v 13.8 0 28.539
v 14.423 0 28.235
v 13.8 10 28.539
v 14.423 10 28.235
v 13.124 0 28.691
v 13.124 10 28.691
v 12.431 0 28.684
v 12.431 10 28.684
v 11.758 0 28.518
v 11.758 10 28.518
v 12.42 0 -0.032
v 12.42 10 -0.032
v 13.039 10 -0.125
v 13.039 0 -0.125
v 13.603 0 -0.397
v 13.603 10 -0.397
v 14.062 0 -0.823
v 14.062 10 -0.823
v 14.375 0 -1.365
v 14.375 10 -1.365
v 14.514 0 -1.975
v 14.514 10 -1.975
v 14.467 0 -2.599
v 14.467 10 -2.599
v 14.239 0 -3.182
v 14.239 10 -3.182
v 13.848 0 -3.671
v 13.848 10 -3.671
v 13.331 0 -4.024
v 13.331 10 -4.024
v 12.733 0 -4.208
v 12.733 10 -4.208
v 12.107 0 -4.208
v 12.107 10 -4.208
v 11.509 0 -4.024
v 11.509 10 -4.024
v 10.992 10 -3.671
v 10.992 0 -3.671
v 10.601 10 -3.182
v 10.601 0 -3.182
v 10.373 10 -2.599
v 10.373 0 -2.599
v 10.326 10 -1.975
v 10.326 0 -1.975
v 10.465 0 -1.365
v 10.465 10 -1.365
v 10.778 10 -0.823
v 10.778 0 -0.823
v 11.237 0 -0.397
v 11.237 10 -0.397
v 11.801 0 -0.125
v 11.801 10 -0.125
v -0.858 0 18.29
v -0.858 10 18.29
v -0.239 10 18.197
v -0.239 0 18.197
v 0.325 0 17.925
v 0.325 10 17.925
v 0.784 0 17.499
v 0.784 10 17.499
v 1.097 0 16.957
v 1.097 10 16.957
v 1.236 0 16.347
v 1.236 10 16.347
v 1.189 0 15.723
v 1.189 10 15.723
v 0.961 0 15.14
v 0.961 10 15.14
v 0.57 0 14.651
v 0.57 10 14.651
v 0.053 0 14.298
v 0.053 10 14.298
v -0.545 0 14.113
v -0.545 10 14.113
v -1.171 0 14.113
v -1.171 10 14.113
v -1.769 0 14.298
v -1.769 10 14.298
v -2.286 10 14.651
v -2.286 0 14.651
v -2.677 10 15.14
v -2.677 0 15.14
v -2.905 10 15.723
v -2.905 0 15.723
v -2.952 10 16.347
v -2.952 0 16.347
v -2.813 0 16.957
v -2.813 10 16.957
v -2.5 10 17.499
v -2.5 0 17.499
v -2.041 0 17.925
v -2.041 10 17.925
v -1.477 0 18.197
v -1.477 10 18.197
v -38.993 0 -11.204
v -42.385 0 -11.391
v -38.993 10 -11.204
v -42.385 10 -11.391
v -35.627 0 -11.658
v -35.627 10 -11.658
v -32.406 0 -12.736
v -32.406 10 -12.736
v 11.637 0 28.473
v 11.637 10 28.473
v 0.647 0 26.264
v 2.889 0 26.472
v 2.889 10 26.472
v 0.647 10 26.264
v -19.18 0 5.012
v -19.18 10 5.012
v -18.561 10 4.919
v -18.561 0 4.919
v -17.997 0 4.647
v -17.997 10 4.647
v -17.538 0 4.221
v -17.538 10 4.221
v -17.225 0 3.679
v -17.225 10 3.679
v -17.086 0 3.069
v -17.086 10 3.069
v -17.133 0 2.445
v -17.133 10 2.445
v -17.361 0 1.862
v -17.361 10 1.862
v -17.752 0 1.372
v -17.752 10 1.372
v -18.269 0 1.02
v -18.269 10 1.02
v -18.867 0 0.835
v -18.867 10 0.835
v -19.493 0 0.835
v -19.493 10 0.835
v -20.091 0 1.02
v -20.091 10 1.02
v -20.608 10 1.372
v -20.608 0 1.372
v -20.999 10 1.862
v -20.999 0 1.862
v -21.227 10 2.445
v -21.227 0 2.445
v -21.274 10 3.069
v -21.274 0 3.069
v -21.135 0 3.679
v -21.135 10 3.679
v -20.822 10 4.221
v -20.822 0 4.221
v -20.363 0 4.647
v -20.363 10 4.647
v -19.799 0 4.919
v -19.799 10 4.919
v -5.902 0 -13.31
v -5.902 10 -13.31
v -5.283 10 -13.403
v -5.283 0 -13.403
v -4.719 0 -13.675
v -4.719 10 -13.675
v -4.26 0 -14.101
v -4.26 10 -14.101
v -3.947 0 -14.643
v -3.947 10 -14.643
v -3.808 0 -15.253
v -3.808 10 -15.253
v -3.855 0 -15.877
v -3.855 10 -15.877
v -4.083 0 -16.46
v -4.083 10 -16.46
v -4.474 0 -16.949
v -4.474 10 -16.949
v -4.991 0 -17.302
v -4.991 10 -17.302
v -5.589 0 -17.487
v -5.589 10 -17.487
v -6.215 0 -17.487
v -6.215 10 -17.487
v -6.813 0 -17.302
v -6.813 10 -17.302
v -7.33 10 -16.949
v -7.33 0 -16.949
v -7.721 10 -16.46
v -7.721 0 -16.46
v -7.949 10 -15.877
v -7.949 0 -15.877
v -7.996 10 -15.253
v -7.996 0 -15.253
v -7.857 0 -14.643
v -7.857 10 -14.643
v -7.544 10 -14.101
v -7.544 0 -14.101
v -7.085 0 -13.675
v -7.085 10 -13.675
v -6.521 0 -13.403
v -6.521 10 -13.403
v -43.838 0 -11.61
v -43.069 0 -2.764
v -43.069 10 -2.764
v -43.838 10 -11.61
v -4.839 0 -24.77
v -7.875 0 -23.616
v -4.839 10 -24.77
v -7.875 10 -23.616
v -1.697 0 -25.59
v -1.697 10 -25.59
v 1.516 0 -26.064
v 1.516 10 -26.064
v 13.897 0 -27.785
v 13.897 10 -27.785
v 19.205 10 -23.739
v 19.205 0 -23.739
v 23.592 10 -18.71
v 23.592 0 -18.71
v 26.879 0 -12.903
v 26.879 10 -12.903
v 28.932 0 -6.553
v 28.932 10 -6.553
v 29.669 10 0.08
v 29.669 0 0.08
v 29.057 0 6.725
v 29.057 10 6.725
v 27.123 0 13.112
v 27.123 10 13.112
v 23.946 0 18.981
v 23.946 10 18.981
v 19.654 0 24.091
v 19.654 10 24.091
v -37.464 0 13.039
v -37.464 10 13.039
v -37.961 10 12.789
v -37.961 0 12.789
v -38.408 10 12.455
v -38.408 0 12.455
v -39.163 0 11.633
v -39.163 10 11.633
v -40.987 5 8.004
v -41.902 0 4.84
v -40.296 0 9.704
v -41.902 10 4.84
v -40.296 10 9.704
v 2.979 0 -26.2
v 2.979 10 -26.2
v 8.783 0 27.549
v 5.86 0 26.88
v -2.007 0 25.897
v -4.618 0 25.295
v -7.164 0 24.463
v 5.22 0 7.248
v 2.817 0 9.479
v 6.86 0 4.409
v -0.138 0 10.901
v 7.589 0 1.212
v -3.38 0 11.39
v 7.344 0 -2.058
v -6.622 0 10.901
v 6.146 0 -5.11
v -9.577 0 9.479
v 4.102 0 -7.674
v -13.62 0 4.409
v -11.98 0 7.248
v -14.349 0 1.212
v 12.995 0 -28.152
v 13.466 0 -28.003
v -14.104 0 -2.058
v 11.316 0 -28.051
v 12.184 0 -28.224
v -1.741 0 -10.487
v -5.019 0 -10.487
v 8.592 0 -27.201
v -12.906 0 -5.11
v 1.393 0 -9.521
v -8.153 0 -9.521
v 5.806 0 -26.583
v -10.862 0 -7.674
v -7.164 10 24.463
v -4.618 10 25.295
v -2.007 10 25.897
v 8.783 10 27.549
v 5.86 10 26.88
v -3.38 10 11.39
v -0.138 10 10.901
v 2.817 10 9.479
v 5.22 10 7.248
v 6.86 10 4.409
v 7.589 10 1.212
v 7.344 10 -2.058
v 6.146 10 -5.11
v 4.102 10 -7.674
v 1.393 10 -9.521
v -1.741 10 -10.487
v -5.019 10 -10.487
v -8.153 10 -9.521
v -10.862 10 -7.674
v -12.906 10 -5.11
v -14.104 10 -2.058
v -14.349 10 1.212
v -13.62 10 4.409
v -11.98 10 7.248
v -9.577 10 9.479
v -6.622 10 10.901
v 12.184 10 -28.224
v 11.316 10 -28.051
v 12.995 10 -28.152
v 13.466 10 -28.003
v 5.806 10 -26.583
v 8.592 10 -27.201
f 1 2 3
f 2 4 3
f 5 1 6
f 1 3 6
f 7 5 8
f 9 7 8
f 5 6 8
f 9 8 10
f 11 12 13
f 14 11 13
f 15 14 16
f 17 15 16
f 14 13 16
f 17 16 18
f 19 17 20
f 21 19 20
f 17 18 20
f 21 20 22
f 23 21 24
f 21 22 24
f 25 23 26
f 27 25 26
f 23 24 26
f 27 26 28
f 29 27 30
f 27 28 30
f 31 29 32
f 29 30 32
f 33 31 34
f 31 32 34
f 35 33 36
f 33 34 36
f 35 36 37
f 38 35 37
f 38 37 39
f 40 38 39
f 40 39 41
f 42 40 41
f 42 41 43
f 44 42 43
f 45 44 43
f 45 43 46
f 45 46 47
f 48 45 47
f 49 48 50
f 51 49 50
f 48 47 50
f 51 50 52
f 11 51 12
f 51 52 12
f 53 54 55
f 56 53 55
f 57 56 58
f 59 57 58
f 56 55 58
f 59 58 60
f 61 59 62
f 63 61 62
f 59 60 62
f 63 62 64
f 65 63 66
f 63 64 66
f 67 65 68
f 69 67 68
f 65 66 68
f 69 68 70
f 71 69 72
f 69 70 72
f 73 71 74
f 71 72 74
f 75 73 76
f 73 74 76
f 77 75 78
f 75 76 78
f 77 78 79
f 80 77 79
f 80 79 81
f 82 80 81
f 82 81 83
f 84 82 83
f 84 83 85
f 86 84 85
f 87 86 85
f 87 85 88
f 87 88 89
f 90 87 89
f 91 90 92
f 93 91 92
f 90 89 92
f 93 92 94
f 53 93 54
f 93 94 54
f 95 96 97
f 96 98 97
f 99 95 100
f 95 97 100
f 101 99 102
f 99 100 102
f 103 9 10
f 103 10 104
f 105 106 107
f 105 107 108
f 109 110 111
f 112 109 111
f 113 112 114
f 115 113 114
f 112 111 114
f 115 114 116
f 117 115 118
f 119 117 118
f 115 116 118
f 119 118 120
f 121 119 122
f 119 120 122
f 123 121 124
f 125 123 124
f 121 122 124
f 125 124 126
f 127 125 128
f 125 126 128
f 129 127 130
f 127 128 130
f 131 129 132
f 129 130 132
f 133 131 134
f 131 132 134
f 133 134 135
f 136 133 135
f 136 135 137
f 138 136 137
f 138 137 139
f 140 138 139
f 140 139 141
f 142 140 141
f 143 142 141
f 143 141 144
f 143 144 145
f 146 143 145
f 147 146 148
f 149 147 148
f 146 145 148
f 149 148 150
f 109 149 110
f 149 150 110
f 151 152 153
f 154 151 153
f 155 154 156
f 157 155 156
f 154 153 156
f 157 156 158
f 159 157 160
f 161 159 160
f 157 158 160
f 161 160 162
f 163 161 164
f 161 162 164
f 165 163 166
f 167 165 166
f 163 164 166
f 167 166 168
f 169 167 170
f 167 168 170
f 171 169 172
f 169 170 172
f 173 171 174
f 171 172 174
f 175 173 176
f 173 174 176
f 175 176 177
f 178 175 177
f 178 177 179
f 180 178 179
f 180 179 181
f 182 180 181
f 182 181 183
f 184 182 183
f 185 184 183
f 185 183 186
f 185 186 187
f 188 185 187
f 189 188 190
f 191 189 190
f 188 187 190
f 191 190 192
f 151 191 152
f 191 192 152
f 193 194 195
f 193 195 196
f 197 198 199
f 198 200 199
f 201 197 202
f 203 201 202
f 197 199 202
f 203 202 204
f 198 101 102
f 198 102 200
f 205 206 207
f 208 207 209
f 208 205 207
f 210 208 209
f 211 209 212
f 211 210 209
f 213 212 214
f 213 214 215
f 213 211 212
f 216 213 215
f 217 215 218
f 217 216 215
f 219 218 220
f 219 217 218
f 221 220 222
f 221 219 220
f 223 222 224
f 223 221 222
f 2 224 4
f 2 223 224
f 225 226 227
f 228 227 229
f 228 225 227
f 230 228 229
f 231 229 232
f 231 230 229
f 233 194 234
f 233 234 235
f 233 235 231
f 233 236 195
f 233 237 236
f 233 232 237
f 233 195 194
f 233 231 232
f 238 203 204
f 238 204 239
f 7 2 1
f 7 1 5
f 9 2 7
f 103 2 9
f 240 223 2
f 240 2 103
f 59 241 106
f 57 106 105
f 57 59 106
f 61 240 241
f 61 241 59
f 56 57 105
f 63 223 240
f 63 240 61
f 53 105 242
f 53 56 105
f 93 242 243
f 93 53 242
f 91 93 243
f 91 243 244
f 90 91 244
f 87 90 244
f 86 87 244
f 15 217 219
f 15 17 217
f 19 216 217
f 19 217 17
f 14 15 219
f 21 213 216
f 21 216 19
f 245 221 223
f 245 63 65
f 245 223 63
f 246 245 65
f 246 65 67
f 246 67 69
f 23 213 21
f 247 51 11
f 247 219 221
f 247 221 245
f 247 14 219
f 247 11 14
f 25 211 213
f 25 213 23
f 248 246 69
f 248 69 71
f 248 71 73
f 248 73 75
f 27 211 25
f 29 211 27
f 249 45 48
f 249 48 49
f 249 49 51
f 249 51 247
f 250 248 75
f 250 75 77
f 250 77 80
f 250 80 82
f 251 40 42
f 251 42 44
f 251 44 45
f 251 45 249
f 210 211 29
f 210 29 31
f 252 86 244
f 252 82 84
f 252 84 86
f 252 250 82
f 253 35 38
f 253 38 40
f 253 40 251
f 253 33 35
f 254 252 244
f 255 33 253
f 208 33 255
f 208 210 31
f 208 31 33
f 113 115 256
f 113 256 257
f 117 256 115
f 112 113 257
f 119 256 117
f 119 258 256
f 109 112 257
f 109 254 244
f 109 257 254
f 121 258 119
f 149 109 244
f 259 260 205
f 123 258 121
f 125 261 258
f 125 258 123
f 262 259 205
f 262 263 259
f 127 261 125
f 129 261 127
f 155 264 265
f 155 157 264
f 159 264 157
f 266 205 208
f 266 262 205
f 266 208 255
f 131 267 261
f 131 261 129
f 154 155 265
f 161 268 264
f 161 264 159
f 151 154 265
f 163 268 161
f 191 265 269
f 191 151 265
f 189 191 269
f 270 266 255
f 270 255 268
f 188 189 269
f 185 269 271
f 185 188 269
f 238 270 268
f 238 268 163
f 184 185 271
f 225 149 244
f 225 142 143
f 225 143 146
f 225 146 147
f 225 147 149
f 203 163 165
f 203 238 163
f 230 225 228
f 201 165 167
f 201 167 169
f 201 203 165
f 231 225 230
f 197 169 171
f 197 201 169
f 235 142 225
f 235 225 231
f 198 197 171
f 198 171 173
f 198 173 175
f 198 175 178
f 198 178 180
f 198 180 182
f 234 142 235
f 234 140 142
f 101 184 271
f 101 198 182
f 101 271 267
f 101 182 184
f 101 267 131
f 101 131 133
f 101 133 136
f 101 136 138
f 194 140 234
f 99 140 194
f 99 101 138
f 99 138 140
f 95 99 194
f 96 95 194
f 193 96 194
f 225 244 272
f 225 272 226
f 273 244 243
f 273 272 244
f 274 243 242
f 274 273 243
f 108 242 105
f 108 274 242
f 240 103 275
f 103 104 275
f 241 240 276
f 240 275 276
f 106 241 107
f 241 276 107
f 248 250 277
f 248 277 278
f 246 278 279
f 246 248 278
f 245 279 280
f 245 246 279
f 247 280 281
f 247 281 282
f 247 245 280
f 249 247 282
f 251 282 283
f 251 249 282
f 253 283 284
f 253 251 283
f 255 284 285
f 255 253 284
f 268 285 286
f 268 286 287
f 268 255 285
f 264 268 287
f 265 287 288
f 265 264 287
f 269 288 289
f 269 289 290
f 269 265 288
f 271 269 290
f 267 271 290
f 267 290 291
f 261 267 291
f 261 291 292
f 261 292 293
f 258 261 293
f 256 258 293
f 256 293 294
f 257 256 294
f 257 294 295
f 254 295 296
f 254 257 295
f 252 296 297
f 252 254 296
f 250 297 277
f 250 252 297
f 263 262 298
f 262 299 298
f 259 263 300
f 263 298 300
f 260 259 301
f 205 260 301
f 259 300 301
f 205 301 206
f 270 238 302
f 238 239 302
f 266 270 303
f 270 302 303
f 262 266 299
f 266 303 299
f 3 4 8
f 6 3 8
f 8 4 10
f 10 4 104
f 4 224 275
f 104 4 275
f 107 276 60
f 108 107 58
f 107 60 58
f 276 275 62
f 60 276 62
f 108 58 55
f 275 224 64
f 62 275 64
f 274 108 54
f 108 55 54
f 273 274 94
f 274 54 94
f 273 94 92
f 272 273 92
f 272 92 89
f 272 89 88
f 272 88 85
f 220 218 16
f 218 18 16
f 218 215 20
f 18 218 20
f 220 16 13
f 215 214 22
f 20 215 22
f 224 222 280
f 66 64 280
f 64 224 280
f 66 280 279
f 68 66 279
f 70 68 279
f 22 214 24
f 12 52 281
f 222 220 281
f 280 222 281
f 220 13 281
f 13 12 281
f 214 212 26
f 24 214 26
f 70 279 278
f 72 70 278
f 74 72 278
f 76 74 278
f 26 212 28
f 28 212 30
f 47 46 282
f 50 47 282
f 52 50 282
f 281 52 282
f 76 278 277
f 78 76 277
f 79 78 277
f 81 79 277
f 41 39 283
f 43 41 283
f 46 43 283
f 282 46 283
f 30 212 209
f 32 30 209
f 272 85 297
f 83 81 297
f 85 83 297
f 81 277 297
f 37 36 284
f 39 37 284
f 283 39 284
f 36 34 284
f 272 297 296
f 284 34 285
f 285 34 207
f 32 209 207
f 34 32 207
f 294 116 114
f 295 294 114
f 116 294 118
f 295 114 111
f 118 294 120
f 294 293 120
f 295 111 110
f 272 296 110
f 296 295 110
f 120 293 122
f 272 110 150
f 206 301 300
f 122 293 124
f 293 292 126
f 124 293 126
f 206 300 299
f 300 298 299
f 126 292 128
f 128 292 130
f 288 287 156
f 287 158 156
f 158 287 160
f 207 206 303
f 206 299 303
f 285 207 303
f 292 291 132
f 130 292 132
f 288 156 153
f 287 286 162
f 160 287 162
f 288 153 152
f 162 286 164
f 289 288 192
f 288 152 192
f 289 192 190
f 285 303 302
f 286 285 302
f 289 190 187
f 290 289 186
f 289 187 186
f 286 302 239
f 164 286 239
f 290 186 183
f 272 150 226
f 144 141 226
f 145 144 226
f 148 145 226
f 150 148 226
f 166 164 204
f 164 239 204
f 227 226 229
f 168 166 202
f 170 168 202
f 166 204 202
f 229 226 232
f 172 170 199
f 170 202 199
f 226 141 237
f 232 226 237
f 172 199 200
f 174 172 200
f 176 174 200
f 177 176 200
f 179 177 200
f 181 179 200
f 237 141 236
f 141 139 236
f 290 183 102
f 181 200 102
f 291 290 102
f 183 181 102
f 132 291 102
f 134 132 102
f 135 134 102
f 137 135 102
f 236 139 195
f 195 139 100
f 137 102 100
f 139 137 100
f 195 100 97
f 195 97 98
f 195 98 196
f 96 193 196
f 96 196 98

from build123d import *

# Parameters (mm, degrees)
SKETCH1_R           = 11
BOSS_EXTRUDE1_DEPTH = 10
SKETCH2_R           = 2.1
CUT_EXTRUDE1_DEPTH  = 10
FILLET2_R           = 18
FILLET3_R           = 30
FILLET4_R           = 34
FILLET7_R           = 3


with BuildPart() as part:
    # Sketch1 → Boss-Extrude1 (new body)
    with BuildSketch(Plane(origin=(0, 0, 0), x_dir=(1, 0, 0), z_dir=(0, 1, 0))):
        with BuildLine():
            Line((-43.837879331, 11.61), (-37.199459056, 10.61))
            Line((-37.199459056, 10.61), (-3.38, 25.61))
            Line((-3.38, 25.61), (7.395945787, 26.61))
            Line((7.395945787, 26.61), (12.62, 28.528895207))
            ThreePointArc((12.62, 28.528895207), (29.66875295, -0.102896427), (13.12, -29.026558802))
            Line((13.12, -29.026558802), (7.395945787, -26.89))
            Line((7.395945787, -26.89), (-3.38, -25.89))
            Line((-3.38, -25.89), (-41.837879331, -11.39))
            Line((-41.837879331, -11.39), (-43.837879331, 11.61))
        make_face()
        with Locations(Location((-3.38, -0.39, 0), (0, 0, 270))):
            Circle(SKETCH1_R, mode=Mode.SUBTRACT)
    extrude(amount=BOSS_EXTRUDE1_DEPTH)

    # Sketch2 → Cut-Extrude1 (cut)
    with BuildSketch(Plane(origin=(0, 10, 0), x_dir=(1, 0, 0), z_dir=(0, 1, 0))):
        with Locations(Location((12.42, 2.131904043, 0), (0, 0, 270))):
            Circle(SKETCH2_R)
        with Locations(Location((-0.858095957, -16.19, 0), (0, 0, 270))):
            Circle(SKETCH2_R)
        with Locations(Location((-19.18, -2.911904043, 0), (0, 0, 270))):
            Circle(SKETCH2_R)
        with Locations(Location((-5.901904043, 15.41, 0), (0, 0, 270))):
            Circle(SKETCH2_R)
    extrude(amount=-CUT_EXTRUDE1_DEPTH, mode=Mode.SUBTRACT)

    # Fillet1
    # an asymmetric fillet: 18, 12 mm, written as the material it takes off along each edge
    with BuildSketch(Plane(origin=(-41.837879331, -35.518473591, 11.39), x_dir=(0.9357013977145019, 0, 0.3527929907397927), z_dir=(0, 1, 0))) as fillet1_piece_1:
        with BuildLine():
            Bezier((4.674389222, 0), (0, 0), (-6.145067451, 12.809686203), weights=[1, 0.846323269, 1])
            Line((-6.145067451, 12.809686203), (0, 0))
            Line((0, 0), (4.674389222, 0))
        make_face()
    extrude(amount=81.036947182, mode=Mode.SUBTRACT)

    # Fillet2
    fillet2_edges = [part.edges().sort_by_distance(p)[0] for p in [
        (-37.199459056, 5, -10.61),
    ]]
    fillet(fillet2_edges, radius=FILLET2_R)

    # Fillet3
    fillet3_edges = [part.edges().sort_by_distance(p)[0] for p in [
        (-3.38, 5, -25.61),
        (-3.38, 5, 25.89),
    ]]
    fillet(fillet3_edges, radius=FILLET3_R)

    # Fillet4
    fillet4_edges = [part.edges().sort_by_distance(p)[0] for p in [
        (7.395945787, 5, -26.61),
        (7.395945787, 5, 26.89),
    ]]
    fillet(fillet4_edges, radius=FILLET4_R)

    # Fillet7
    fillet7_edges = [part.edges().sort_by_distance(p)[0] for p in [
        (12.62, 5, -28.528895207),
        (13.12, 5, 29.026558802),
    ]]
    fillet(fillet7_edges, radius=FILLET7_R)


solid = part.part
